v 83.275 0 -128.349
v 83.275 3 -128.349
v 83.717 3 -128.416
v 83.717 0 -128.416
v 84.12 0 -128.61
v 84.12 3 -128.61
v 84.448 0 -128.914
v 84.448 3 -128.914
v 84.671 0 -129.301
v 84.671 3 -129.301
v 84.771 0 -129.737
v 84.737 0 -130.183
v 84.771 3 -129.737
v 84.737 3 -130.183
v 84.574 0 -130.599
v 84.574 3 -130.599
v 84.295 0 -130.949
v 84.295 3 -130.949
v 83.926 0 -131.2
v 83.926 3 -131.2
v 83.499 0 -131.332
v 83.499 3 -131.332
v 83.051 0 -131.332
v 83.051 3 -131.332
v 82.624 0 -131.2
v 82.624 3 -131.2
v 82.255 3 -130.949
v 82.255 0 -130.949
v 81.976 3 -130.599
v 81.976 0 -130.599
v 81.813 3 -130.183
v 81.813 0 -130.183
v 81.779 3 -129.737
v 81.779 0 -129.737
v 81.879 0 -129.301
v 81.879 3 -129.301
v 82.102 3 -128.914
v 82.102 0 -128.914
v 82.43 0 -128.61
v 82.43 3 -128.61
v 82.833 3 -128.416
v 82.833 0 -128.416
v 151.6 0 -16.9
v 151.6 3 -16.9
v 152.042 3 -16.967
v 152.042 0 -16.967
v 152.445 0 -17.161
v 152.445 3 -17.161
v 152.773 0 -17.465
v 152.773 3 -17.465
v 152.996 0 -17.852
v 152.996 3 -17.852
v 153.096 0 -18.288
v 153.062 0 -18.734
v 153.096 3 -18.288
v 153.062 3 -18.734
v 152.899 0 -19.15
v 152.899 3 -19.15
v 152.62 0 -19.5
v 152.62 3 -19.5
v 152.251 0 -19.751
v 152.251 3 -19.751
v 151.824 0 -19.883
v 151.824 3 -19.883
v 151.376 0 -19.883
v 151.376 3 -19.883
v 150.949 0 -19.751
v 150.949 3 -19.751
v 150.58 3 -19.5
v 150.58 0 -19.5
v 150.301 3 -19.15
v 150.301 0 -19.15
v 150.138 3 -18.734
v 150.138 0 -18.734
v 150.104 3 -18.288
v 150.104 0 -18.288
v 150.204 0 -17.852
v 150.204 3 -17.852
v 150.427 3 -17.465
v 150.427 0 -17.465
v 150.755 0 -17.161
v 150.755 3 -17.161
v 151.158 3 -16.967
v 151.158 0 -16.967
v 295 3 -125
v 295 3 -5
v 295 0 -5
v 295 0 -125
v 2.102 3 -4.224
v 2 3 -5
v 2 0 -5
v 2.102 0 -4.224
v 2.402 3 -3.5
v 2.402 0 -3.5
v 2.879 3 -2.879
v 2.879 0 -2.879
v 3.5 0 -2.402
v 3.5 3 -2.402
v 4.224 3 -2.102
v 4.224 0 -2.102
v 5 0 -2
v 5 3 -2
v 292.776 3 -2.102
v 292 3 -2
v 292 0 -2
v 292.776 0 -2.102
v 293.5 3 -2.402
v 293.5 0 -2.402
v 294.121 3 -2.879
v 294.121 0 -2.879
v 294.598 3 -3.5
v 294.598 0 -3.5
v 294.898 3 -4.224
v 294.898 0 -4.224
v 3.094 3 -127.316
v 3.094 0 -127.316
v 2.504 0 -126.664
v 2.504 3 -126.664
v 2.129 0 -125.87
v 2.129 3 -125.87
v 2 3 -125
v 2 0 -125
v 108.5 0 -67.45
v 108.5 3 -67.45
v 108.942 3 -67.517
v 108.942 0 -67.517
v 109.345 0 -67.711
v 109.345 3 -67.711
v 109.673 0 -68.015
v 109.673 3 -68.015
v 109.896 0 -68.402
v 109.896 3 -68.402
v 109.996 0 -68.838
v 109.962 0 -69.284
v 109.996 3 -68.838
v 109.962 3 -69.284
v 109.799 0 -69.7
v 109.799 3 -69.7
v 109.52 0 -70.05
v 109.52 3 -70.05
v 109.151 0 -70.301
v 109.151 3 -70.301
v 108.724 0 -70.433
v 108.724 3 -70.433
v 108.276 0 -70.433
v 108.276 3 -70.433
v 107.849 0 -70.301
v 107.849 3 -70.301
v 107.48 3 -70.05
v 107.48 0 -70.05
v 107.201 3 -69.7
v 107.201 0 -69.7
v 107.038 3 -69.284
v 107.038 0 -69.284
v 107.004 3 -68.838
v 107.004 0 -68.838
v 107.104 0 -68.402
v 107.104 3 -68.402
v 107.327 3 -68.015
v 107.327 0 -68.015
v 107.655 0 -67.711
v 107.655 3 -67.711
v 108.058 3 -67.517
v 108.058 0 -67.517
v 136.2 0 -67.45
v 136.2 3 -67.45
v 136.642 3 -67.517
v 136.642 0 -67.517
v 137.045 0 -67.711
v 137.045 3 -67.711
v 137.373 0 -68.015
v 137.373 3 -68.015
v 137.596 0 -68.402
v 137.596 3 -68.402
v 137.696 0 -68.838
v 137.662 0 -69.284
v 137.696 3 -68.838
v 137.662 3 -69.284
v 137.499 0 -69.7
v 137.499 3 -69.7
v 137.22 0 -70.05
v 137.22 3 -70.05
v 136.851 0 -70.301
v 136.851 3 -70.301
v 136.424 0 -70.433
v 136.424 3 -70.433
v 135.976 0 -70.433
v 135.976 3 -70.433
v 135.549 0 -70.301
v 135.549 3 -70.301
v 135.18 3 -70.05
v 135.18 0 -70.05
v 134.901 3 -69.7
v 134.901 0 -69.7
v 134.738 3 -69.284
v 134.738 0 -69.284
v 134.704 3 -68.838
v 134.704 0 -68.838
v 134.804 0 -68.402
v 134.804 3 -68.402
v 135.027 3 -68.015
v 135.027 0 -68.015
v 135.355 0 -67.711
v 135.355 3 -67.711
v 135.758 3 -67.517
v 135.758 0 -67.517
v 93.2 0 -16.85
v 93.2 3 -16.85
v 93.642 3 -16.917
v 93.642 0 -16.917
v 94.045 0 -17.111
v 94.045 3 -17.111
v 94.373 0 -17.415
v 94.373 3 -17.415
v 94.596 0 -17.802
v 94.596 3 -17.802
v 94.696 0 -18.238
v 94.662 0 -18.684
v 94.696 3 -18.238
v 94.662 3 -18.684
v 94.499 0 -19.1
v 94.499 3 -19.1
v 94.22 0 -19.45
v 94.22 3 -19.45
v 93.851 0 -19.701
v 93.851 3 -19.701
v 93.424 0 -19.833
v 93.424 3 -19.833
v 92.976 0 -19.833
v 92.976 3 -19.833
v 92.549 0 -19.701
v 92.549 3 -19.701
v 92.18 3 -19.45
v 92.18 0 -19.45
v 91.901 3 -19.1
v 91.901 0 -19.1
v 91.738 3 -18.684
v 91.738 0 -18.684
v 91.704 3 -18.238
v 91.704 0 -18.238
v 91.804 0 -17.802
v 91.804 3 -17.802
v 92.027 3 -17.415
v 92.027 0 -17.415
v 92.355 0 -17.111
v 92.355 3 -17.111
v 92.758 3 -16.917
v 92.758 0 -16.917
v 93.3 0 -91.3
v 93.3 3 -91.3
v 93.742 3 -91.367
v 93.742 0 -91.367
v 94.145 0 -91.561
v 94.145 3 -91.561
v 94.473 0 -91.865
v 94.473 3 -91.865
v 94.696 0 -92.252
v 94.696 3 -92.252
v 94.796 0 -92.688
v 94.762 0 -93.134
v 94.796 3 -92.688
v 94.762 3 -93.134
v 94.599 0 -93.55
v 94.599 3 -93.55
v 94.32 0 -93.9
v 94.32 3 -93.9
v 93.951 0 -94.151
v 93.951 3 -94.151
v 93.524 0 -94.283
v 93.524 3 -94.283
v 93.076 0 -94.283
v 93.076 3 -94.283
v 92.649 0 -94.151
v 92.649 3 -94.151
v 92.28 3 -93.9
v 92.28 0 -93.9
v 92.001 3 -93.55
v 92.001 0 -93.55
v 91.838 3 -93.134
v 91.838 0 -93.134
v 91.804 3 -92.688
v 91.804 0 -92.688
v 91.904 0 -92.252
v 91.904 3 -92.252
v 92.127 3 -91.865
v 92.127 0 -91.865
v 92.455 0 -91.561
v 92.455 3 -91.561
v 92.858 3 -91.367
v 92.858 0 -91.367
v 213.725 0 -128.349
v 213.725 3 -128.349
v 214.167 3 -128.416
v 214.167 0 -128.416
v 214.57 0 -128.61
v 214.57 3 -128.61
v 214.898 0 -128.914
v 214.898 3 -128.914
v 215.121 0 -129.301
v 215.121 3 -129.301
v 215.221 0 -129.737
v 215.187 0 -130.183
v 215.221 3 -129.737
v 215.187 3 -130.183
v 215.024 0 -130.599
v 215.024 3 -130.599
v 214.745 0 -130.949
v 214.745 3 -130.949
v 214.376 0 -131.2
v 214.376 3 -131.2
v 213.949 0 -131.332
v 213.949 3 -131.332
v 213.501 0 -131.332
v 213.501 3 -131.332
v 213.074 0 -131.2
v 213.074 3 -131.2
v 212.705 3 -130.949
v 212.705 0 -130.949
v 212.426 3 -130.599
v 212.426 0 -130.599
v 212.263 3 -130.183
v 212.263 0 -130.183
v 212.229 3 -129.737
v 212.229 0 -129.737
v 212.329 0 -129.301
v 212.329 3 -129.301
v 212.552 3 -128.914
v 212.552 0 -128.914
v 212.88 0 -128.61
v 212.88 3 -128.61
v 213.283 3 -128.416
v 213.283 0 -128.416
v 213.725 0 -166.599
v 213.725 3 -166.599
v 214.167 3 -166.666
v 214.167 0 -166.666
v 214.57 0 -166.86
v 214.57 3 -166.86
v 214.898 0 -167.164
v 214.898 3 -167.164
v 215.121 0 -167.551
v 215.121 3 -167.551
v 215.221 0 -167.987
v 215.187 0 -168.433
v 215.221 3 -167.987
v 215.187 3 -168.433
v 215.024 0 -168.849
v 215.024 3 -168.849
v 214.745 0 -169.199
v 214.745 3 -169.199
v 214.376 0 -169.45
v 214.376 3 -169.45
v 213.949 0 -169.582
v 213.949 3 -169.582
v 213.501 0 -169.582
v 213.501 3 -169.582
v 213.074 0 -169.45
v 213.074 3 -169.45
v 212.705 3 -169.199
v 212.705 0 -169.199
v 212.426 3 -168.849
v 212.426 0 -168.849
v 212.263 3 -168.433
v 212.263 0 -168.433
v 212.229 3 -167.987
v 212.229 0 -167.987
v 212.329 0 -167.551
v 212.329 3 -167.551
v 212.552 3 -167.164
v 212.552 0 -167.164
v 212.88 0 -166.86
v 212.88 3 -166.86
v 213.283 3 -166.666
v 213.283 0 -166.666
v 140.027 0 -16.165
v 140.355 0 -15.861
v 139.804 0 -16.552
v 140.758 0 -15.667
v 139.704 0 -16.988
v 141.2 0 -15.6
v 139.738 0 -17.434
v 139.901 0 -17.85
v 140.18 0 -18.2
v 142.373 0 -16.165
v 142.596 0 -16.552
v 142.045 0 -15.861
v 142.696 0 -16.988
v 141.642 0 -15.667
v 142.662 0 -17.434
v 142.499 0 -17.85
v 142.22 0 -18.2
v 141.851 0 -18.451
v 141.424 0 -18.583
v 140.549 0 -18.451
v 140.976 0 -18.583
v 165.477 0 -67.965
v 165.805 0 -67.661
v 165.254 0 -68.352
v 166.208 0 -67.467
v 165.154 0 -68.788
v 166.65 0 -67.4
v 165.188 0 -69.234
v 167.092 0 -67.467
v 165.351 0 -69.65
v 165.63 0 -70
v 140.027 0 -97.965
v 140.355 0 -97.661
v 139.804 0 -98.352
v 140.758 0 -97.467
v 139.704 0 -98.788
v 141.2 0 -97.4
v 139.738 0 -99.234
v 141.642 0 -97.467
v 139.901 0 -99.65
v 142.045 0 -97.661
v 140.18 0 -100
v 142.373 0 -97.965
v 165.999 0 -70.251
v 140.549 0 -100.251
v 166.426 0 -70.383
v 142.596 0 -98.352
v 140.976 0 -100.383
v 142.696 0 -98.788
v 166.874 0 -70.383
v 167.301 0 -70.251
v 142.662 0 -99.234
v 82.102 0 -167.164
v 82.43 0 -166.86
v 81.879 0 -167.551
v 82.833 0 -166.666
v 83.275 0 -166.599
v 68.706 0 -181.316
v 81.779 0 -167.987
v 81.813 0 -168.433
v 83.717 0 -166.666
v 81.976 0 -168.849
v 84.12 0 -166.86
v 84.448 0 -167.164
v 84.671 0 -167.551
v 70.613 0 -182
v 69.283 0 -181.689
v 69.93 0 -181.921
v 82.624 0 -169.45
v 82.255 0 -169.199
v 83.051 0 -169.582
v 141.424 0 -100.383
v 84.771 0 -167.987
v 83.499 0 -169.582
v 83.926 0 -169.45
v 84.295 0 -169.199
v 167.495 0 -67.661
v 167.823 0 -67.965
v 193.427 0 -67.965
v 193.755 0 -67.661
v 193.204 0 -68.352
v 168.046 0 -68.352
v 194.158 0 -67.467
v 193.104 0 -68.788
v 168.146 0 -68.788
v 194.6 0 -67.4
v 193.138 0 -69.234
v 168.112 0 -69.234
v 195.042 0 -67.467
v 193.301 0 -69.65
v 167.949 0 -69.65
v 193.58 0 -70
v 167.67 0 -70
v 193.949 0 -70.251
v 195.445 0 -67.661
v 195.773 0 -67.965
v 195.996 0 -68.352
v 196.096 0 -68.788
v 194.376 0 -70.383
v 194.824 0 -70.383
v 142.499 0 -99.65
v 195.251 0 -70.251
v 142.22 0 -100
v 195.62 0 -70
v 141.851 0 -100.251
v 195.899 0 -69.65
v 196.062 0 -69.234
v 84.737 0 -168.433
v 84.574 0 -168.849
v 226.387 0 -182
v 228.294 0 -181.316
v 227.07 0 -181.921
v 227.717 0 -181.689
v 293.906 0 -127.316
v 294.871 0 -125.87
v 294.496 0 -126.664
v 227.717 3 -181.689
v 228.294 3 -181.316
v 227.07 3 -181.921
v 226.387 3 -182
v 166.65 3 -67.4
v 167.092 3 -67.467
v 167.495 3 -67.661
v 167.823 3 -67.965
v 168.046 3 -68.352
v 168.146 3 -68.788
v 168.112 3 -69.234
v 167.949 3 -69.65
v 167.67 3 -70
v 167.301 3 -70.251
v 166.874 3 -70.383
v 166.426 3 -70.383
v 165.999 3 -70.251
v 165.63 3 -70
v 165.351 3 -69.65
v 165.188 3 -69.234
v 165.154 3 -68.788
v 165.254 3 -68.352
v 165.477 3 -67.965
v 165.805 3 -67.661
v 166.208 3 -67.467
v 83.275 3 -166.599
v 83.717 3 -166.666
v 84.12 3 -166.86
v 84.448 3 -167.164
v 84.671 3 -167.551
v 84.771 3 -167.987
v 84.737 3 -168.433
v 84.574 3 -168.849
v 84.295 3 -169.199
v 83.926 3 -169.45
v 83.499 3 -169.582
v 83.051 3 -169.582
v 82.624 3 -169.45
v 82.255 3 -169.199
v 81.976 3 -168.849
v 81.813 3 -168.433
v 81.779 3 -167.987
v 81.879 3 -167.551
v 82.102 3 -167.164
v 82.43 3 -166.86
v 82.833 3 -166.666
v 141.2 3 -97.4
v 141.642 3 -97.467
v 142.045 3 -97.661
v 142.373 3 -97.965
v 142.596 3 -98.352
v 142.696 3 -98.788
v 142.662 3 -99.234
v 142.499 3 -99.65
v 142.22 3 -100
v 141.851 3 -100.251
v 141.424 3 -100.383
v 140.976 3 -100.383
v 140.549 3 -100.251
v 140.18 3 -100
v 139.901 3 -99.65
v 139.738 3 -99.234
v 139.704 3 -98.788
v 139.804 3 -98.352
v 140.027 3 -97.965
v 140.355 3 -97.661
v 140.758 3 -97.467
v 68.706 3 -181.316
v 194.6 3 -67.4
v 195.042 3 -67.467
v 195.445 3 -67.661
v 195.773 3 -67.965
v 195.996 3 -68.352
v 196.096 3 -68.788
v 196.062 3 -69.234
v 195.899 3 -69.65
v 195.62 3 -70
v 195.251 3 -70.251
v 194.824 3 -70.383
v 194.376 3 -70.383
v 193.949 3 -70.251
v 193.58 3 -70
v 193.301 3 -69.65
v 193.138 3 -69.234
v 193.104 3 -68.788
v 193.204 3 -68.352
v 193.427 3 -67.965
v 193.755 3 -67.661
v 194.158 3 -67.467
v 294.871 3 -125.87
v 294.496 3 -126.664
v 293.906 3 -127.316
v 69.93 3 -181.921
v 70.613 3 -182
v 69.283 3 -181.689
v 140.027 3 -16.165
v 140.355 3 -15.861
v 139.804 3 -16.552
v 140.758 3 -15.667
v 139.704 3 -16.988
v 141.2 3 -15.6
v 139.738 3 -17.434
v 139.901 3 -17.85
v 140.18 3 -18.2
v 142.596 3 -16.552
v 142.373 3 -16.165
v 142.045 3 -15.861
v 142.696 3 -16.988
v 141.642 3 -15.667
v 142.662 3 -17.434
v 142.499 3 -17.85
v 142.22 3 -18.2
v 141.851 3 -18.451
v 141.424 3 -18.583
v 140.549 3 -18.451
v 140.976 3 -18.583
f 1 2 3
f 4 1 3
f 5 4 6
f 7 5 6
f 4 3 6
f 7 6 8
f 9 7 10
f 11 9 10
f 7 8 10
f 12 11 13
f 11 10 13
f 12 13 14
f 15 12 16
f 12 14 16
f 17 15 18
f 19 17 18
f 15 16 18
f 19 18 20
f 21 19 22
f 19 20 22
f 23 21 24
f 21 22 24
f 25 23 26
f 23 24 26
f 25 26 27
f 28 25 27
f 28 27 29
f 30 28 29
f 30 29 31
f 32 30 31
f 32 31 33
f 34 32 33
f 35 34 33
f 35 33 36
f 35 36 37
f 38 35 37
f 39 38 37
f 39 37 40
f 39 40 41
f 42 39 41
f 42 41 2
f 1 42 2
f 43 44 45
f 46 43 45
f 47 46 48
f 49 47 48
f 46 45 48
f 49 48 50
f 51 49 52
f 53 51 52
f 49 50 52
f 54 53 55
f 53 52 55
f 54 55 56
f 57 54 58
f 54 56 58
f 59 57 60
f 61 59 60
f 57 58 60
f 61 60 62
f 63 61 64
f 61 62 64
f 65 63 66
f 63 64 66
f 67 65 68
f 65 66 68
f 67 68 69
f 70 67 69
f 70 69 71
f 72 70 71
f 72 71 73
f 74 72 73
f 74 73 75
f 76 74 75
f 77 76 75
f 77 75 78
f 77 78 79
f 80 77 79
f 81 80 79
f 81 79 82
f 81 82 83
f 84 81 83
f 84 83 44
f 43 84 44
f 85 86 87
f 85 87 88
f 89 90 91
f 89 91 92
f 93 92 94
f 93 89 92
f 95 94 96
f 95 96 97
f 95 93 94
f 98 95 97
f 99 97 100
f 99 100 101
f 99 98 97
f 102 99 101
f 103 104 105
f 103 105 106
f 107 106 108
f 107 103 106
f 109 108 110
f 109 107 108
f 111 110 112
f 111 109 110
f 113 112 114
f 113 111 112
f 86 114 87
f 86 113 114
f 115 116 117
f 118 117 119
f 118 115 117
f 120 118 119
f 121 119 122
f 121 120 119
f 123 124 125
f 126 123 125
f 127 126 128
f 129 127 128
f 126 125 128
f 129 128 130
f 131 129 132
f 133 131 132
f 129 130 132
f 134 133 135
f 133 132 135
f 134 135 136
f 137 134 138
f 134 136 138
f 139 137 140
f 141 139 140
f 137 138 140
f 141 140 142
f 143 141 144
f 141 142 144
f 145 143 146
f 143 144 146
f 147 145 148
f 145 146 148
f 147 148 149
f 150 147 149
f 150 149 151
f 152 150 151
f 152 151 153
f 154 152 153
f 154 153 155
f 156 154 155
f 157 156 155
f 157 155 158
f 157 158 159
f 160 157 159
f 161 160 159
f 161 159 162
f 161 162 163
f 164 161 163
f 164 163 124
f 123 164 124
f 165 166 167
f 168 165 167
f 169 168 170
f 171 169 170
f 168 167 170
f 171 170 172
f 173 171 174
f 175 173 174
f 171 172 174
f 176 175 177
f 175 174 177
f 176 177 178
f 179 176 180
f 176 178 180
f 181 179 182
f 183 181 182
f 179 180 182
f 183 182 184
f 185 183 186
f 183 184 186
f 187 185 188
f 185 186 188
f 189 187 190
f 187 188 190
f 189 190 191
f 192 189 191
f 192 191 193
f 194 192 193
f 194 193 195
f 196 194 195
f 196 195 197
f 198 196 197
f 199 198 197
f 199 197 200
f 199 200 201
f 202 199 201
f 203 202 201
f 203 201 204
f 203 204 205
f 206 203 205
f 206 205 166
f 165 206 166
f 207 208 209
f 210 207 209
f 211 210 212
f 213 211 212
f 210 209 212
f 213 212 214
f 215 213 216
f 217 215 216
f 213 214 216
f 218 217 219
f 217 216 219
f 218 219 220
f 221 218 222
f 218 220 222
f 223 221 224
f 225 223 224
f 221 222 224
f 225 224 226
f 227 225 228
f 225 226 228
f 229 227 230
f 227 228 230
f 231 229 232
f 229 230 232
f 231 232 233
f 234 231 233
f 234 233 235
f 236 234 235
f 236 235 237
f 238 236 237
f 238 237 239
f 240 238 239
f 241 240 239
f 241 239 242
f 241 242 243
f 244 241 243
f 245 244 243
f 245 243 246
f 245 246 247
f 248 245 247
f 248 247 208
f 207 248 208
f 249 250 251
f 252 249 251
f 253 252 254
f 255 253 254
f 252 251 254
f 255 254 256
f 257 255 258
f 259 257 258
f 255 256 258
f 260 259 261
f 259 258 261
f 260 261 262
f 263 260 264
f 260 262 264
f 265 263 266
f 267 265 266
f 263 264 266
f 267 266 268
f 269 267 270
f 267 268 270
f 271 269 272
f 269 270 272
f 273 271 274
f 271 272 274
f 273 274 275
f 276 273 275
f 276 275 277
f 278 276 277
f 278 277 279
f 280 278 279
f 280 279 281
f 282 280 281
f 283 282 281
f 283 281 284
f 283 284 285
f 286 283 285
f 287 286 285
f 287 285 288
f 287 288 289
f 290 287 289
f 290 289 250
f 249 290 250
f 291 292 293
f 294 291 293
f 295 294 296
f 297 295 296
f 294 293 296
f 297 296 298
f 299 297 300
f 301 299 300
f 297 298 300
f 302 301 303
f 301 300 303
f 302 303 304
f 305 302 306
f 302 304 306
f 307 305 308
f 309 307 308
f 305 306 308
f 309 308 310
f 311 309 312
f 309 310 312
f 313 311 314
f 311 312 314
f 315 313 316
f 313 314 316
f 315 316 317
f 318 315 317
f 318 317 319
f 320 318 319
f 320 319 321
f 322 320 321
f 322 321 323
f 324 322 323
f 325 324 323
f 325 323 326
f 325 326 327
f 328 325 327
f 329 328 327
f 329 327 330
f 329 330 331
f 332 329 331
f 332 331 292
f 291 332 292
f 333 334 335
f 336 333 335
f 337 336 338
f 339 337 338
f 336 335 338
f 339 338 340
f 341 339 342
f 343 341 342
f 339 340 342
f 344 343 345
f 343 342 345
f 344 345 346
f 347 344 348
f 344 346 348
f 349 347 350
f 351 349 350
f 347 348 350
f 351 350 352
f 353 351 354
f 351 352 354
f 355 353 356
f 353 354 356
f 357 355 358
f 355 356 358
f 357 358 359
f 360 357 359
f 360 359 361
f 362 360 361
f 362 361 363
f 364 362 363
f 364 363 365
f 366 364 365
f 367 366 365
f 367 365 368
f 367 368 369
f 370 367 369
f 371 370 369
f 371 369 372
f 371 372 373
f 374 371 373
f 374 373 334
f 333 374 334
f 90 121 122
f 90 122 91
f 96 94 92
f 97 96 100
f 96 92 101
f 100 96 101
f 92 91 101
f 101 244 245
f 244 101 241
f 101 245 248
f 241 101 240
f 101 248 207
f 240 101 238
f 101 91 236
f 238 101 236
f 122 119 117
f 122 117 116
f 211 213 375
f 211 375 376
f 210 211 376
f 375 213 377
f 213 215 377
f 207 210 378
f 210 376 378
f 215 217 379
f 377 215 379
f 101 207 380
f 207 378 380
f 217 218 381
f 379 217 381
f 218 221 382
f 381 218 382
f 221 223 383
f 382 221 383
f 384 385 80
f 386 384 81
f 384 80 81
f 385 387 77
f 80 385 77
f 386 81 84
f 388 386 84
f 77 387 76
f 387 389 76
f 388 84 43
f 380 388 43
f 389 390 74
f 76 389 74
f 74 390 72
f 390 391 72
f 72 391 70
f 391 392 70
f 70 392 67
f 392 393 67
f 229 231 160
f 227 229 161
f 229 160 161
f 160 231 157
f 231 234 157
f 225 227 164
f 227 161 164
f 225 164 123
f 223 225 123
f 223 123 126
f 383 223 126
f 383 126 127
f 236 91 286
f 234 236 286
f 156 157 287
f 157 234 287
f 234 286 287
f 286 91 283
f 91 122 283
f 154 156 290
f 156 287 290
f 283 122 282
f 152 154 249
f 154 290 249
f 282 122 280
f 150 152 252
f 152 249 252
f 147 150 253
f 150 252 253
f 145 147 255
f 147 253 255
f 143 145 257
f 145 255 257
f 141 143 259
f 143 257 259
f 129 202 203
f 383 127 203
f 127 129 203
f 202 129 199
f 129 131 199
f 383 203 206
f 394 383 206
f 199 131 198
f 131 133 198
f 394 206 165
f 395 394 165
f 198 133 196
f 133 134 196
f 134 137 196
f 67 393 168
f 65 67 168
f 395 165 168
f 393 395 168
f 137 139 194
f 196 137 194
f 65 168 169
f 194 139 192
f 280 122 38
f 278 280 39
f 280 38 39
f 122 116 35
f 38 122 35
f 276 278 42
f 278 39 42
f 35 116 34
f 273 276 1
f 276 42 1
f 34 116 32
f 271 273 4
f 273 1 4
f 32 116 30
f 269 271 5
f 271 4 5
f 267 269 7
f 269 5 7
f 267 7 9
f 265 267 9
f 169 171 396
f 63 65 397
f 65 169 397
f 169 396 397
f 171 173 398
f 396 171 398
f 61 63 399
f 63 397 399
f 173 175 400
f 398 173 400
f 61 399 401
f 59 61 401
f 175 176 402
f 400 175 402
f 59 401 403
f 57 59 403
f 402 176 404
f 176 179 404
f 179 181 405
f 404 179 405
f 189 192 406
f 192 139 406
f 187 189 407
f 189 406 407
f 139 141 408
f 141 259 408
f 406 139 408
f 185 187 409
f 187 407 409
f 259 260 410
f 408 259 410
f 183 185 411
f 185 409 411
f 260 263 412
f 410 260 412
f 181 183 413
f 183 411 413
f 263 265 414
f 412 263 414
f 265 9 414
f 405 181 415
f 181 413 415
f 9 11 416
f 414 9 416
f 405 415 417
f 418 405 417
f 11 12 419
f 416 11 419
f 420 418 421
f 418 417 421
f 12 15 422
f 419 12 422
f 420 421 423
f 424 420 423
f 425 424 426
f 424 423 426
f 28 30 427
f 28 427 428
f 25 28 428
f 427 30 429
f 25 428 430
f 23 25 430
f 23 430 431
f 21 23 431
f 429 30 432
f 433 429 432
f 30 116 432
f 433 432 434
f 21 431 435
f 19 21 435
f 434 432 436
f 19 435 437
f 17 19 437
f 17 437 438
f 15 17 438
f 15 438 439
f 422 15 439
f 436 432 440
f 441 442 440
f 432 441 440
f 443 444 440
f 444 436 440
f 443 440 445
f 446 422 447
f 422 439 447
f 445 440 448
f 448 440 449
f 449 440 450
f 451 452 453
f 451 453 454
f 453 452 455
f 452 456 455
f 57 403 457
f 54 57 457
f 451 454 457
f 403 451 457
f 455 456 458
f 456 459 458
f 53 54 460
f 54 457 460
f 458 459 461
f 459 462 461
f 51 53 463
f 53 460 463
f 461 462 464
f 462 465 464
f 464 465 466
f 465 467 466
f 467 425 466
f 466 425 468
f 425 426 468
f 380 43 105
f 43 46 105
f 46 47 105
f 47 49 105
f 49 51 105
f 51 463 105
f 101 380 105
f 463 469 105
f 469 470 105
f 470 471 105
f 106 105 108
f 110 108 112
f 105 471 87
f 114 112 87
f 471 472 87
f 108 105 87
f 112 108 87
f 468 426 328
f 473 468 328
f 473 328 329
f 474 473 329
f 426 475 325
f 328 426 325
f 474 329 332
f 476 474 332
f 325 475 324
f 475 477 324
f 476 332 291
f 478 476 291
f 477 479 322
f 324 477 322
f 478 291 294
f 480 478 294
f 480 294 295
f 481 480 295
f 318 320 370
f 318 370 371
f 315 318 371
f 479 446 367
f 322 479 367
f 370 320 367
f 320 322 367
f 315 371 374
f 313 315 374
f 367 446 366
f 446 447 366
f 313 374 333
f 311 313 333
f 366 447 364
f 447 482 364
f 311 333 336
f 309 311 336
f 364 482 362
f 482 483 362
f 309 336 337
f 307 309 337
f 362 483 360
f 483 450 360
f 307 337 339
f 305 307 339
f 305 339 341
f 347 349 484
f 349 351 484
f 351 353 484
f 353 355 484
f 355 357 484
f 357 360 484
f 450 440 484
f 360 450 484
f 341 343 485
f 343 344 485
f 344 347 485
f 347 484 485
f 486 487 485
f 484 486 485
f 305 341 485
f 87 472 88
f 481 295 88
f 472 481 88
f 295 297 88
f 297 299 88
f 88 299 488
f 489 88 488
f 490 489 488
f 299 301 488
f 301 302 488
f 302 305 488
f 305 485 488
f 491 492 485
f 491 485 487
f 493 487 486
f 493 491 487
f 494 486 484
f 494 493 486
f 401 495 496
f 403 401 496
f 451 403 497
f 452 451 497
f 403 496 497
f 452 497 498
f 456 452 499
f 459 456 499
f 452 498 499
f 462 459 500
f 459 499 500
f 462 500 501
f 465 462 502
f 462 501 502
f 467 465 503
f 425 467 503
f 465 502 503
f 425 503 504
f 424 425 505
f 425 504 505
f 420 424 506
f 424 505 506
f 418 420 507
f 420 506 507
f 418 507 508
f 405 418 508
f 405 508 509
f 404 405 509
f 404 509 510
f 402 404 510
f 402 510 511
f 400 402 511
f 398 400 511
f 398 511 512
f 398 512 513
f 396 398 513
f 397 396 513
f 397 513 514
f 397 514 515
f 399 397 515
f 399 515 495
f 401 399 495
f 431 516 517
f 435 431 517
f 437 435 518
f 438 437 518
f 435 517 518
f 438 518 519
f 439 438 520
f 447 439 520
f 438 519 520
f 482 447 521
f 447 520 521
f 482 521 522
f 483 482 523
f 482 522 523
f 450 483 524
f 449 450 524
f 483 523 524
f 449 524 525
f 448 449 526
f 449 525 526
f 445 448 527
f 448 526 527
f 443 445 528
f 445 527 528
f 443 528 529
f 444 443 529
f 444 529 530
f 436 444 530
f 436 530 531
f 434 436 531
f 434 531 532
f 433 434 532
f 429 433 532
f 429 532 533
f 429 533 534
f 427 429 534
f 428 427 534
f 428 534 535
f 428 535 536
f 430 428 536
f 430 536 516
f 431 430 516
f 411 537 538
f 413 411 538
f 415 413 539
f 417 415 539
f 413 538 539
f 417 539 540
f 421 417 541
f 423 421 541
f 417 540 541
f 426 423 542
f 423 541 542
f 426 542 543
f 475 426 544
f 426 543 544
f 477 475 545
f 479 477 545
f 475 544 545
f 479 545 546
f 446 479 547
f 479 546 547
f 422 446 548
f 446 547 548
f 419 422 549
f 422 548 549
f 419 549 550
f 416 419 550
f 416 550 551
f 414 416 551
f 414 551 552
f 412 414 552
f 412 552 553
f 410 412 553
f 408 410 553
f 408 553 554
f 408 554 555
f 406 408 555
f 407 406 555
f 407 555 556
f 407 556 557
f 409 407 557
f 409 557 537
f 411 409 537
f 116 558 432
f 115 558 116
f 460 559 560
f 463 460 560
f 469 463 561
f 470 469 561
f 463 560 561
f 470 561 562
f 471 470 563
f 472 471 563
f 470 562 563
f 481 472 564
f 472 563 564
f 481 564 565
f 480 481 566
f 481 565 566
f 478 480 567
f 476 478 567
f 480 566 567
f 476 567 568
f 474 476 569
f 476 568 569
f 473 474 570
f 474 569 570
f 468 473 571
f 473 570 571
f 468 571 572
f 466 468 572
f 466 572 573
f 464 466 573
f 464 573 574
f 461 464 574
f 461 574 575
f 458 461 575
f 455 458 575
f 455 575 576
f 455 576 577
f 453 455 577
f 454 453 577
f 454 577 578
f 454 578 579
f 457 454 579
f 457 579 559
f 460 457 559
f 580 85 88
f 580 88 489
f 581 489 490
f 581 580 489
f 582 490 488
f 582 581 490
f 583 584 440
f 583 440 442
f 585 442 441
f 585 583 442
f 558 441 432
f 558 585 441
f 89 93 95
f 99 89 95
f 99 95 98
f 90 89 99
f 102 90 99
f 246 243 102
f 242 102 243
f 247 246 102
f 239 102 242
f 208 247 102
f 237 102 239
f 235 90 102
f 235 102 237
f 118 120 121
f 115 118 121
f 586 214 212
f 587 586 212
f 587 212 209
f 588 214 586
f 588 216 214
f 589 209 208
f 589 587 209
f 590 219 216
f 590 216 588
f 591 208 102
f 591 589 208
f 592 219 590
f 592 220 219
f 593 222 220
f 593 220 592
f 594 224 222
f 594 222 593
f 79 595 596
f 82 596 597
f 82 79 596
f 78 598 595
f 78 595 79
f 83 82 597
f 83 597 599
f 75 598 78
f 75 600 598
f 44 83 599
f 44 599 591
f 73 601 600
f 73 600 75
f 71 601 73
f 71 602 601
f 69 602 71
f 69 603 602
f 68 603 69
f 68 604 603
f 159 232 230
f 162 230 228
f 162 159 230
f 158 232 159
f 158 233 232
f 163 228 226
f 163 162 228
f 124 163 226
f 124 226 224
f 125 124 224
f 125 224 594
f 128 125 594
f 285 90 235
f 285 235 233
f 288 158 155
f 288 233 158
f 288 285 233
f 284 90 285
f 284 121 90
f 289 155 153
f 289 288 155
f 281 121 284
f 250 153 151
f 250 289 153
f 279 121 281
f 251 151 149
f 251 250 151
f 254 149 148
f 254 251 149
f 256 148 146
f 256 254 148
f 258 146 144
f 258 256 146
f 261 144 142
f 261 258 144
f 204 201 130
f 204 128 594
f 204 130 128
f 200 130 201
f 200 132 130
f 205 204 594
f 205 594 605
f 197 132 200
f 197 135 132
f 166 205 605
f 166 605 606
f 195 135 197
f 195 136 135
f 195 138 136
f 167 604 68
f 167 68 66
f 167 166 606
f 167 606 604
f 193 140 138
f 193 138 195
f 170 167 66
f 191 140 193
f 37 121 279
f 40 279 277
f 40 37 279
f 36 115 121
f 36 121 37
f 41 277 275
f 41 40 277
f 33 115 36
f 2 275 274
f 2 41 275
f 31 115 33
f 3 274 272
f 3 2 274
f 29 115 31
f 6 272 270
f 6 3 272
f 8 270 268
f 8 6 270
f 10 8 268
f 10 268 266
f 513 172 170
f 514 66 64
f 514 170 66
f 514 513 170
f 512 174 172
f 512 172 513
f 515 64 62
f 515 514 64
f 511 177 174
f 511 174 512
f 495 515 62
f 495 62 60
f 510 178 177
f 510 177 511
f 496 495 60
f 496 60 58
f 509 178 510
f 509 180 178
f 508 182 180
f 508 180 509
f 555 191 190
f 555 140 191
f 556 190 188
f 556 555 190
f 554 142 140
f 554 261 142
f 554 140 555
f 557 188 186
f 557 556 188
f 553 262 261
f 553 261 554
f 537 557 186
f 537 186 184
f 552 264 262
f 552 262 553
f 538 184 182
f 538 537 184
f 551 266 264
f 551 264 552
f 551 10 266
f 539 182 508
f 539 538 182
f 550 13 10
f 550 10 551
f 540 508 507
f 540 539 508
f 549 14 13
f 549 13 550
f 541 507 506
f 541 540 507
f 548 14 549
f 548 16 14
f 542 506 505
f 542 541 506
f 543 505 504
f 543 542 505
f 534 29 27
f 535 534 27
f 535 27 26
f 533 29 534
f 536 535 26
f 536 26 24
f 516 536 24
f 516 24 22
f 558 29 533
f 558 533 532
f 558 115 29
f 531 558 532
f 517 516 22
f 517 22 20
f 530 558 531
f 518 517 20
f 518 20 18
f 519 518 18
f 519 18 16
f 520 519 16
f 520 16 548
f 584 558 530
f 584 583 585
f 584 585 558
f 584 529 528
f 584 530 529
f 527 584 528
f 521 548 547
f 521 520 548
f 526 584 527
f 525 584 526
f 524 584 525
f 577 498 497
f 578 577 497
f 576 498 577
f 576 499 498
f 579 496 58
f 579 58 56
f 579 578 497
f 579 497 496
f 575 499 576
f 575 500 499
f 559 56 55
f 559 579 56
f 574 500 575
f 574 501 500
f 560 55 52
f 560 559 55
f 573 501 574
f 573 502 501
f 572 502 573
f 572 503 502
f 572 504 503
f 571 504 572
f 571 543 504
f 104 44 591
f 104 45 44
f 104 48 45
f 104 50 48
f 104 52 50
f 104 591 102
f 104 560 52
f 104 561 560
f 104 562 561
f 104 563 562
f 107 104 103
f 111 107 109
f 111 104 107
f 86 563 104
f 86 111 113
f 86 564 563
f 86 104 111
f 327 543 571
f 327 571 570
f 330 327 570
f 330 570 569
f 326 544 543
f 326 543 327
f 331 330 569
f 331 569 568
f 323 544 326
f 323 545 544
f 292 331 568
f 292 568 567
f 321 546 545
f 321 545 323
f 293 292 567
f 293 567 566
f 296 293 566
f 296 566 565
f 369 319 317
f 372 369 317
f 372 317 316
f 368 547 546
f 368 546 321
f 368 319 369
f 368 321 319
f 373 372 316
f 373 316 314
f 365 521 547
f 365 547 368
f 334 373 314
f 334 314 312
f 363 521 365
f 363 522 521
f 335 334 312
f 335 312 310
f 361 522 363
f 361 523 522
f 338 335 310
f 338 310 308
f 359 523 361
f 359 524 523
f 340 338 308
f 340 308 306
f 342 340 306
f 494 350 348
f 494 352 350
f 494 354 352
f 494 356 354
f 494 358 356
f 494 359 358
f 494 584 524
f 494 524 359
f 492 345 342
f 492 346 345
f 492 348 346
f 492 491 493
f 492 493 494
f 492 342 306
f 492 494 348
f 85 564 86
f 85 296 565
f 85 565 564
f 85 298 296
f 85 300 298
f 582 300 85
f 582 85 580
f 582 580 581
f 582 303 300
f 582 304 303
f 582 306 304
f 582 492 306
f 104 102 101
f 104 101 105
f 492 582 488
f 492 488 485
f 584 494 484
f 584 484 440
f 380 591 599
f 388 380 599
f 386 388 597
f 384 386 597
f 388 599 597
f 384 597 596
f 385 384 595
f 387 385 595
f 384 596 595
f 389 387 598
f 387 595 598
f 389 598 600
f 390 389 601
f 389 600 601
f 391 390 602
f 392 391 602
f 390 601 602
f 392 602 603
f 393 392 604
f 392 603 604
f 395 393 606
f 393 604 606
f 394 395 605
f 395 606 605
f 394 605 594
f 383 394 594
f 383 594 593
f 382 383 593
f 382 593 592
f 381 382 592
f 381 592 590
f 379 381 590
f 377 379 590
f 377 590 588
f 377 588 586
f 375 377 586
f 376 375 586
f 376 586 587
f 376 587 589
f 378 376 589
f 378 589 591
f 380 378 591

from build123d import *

# Parameters (mm, degrees)
SKETCH1_W               = 297
SKETCH1_H               = 210
BOSS_EXTRUDE1_DEPTH     = 3
SKETCH2_OUTSIDE_W       = 371.752
SKETCH2_OUTSIDE_H       = 284.752
SKETCH2_OUTSIDE_R       = 1.5
LASER_CUT_PROFILE_DEPTH = 364.755412331


with BuildPart() as part:
    # Sketch1 → Boss-Extrude1 (new body)
    with BuildSketch(Plane(origin=(0, 0, 0), x_dir=(1, 0, 0), z_dir=(0, 1, 0))):
        with Locations((148.5, 105)):
            Rectangle(SKETCH1_W, SKETCH1_H)
    extrude(amount=BOSS_EXTRUDE1_DEPTH)

    # Sketch2 outside → Laser Cut Profile (cut, through all)
    # profile 1 of 14: a face of its own
    with BuildSketch(Plane(origin=(0, 3, 0), x_dir=(1, 0, 0), z_dir=(0, 1, 0))):
        with Locations((148.5, 105)):
            Rectangle(SKETCH2_OUTSIDE_W, SKETCH2_OUTSIDE_H)
        with BuildLine():
            Line((5, 2), (292, 2))
            ThreePointArc((292, 2), (294.121320344, 2.878679656), (295, 5))
            Line((295, 5), (295, 125))
            ThreePointArc((295, 125), (294.712859503, 126.280778403), (293.906404455, 127.316381241))
            Line((293.906404455, 127.316381241), (228.29357677, 181.316381241))
            ThreePointArc((228.29357677, 181.316381241), (227.399806572, 181.823928445), (226.387172315, 182))
            Line((226.387172315, 182), (70.612827685, 182))
            ThreePointArc((70.612827685, 182), (69.600193428, 181.823928445), (68.70642323, 181.316381241))
            Line((68.70642323, 181.316381241), (3.093595545, 127.316381241))
            ThreePointArc((3.093595545, 127.316381241), (2.287140497, 126.280778403), (2, 125))
            Line((2, 125), (2, 5))
            ThreePointArc((2, 5), (2.878679656, 2.878679656), (5, 2))
        make_face(mode=Mode.SUBTRACT)
    # profile 2 of 14: a face of its own
    with BuildSketch(Plane(origin=(0, 3, 0), x_dir=(1, 0, 0), z_dir=(0, 1, 0))):
        with Locations(Location((93.3, 92.8, 0), (0, 0, 270))):
            Circle(SKETCH2_OUTSIDE_R)
    # profile 3 of 14: a face of its own
    with BuildSketch(Plane(origin=(0, 3, 0), x_dir=(1, 0, 0), z_dir=(0, 1, 0))):
        with Locations(Location((141.2, 98.9, 0), (0, 0, 270))):
            Circle(SKETCH2_OUTSIDE_R)
    # profile 4 of 14: a face of its own
    with BuildSketch(Plane(origin=(0, 3, 0), x_dir=(1, 0, 0), z_dir=(0, 1, 0))):
        with Locations(Location((136.2, 68.95, 0), (0, 0, 270))):
            Circle(SKETCH2_OUTSIDE_R)
    # profile 5 of 14: a face of its own
    with BuildSketch(Plane(origin=(0, 3, 0), x_dir=(1, 0, 0), z_dir=(0, 1, 0))):
        with Locations(Location((108.5, 68.95, 0), (0, 0, 270))):
            Circle(SKETCH2_OUTSIDE_R)
    # profile 6 of 14: a face of its own
    with BuildSketch(Plane(origin=(0, 3, 0), x_dir=(1, 0, 0), z_dir=(0, 1, 0))):
        with Locations(Location((93.2, 18.35, 0), (0, 0, 270))):
            Circle(SKETCH2_OUTSIDE_R)
    # profile 7 of 14: a face of its own
    with BuildSketch(Plane(origin=(0, 3, 0), x_dir=(1, 0, 0), z_dir=(0, 1, 0))):
        with Locations(Location((141.2, 17.1, 0), (0, 0, 270))):
            Circle(SKETCH2_OUTSIDE_R)
    # profile 8 of 14: a face of its own
    with BuildSketch(Plane(origin=(0, 3, 0), x_dir=(1, 0, 0), z_dir=(0, 1, 0))):
        with Locations(Location((151.6, 18.4, 0), (0, 0, 270))):
            Circle(SKETCH2_OUTSIDE_R)
    # profile 9 of 14: a face of its own
    with BuildSketch(Plane(origin=(0, 3, 0), x_dir=(1, 0, 0), z_dir=(0, 1, 0))):
        with Locations(Location((166.65, 68.9, 0), (0, 0, 270))):
            Circle(SKETCH2_OUTSIDE_R)
    # profile 10 of 14: a face of its own
    with BuildSketch(Plane(origin=(0, 3, 0), x_dir=(1, 0, 0), z_dir=(0, 1, 0))):
        with Locations(Location((194.6, 68.9, 0), (0, 0, 270))):
            Circle(SKETCH2_OUTSIDE_R)
    # profile 11 of 14: a face of its own
    with BuildSketch(Plane(origin=(0, 3, 0), x_dir=(1, 0, 0), z_dir=(0, 1, 0))):
        with Locations(Location((83.275, 129.849046067, 0), (0, 0, 270))):
            Circle(SKETCH2_OUTSIDE_R)
    # profile 12 of 14: a face of its own
    with BuildSketch(Plane(origin=(0, 3, 0), x_dir=(1, 0, 0), z_dir=(0, 1, 0))):
        with Locations(Location((213.725, 129.849046067, 0), (0, 0, 270))):
            Circle(SKETCH2_OUTSIDE_R)
    # profile 13 of 14: a face of its own
    with BuildSketch(Plane(origin=(0, 3, 0), x_dir=(1, 0, 0), z_dir=(0, 1, 0))):
        with Locations(Location((83.275, 168.099046067, 0), (0, 0, 270))):
            Circle(SKETCH2_OUTSIDE_R)
    # profile 14 of 14: a face of its own
    with BuildSketch(Plane(origin=(0, 3, 0), x_dir=(1, 0, 0), z_dir=(0, 1, 0))):
        with Locations(Location((213.725, 168.099046067, 0), (0, 0, 270))):
            Circle(SKETCH2_OUTSIDE_R)
    extrude(amount=-LASER_CUT_PROFILE_DEPTH, mode=Mode.SUBTRACT)


solid = part.part
